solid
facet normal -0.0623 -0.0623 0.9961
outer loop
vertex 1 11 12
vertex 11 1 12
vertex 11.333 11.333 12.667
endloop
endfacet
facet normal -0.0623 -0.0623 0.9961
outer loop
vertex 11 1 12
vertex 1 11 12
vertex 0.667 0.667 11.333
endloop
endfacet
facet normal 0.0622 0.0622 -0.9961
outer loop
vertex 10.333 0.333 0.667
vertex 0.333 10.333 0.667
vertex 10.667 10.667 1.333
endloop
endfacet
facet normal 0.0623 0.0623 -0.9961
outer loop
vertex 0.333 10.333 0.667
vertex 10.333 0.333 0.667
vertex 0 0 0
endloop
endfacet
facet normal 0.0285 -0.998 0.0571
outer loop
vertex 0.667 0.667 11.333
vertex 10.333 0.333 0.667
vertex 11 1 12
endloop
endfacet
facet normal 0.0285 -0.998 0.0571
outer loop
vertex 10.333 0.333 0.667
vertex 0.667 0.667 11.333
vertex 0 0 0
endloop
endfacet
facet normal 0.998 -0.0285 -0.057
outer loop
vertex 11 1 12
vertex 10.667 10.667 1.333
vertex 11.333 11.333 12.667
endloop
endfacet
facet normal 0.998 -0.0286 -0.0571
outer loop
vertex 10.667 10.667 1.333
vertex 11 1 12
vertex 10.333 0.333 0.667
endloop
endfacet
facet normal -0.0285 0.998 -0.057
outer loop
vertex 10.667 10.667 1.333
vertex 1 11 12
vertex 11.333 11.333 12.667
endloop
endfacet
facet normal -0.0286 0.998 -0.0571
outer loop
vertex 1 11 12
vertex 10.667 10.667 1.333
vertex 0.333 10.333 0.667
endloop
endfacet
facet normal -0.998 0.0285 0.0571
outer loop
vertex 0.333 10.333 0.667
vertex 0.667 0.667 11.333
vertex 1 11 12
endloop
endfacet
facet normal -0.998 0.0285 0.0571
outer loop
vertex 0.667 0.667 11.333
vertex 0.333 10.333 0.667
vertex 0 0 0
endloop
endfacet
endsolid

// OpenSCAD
/*

Model(or model), World and View spaces: http://www.codinglabs.net/article_world_view_projection_matrix.aspx
Transformation to View space: https://www.3dgep.com/understanding-the-view-matrix/

We use a "Look At Camera" with Eye position, up vector and target point (and zoom)


camera pos / rel pos; up/down/left/right/front/back/rotatex/rotatey/rotatez/rotateStep
view at object pos / rel pos; up/down/left/right/front/back, distance+vektorzoom
speed/time
accelspline-in / spline-out
fps
start/end
fadein/fadeoutsame as view at object
camera( [  cpoint( cameraAbsolute=[x,y,z], viewAtAbsolute=[x,y,z],zoom=50),  cpoint( name="point2", cameraUp=100, speed=50)] , fps=30) myModel();
move( [  mpoint(visible=false),  mpoint(sync="point2", fadein=true,distance=30),  mpoint(fadeout=true)]) myModel();
 */
/*
function v(d) =	[[0, 0, 90],[0, 0, 0],d];

vv = v(100);
$vpr = vv[0]; $vpt = vv[1]; $vpd = vv[2];
rotate([0,0,$t*360])
	cube([10,20,50],center=true);
*/


/*
uses
adaptions from http://forum.openscad.org/How-to-set-camera-angle-td22497.html by Ronaldo
and https://stackoverflow.com/questions/1568568/how-to-convert-euler-angles-to-directional-vector by Adisak (third column of the ORDER_XYZ)
 */

cam_top  =  [0,0,1];

zoom=1.2;//0.5*cos(360*$t) + 2*(1-cos(360*$t));
cam_pos = [100,100,200];
viewAt_pos = [-5,10,20];

cam_dist =  100;
cam_dir  = -[10,10,20];

echo(zoom=zoom);

module model()
cube(10);

$vpd = zoom*cam_dist;
$vpr = RM2EAxyz(camRot(cam_dir,cam_top));
$vpt = cam_pos+unit(cam_dir)*cam_dist;
echo(vpd=$vpd,vpr=$vpr,vpt=$vpt);

echo(cam_dir_unit=unit(cam_dir));
//echo(r_cam_dir1=[sin($vpr.z),-(sin($vpr.x)*cos($vpr.z)),cos($vpr.x)*cos($vpr.y)]);
//echo(r_cam_dir2=[cos($vpr.x)*cos($vpr.y),sin($vpr.x)*cos($vpr.y),sin($vpr.y)]);
//echo(r_cam_dir3=[sin($vpr.x),-(sin($vpr.y)*cos($vpr.x)),-(cos($vpr.y)*cos($vpr.x))]);
//echo(sinx=sin($vpr.x),siny=sin($vpr.y),sinz=sin($vpr.z));
//echo(cosx=cos($vpr.x),cosy=cos($vpr.y),cosz=cos($vpr.z));
//echo(cosx_sinx=cos($vpr.x)*sin($vpr.x),sinx_sinz=sin($vpr.x)*sin($vpr.z),cosx_sinz=cos($vpr.x)*sin($vpr.z));
echo(r_cam_dirX=EAxyz2CamDir($vpr));

rot  = camRot(cam_dir,cam_top);
irot = transpose(rot);// rot inverse

multmatrix(irot*mscale([1,1,zoom])*rot) // the compress or stretch of the model
	model();

// converts a rotation matrix into the Euler angles
// with the order Rx.Ry.Rz
function RM2EAxyz(M) =
	let( sy = norm([M[0][0],M[0][1]]) )
	sy > 1e-6 ?
		[   atan2(M[1][2], M[2][2]),
			atan2(-M[0][2], sy),
			atan2(M[0][1], M[0][0]) ] :
		[   atan2(-M[2][1], M[1][1]),
			atan2(-M[0][2], sy),
			0 ];

// the rotation matrix of a camera local system
function camRot(dir,top) =
	let(	dx = cross(dir,top),
			dy = -cross(dir,dx) )
	[unit(dx), unit(dy), -unit(dir)];

function EAxyz2CamDir(vpr) = [-sin(vpr.x)*sin(vpr.z),sin(vpr.x)*cos(vpr.z),-cos(vpr.x)];

// scale matrix
function mscale(s) = [for(i=[0:2])[for(j=[0:2]) i==j? s[i]: 0]];

function unit(v) = v/norm(v);

function transpose(M) = [for(j=[0:2])[for(i=[0:2]) M[i][j]]];
